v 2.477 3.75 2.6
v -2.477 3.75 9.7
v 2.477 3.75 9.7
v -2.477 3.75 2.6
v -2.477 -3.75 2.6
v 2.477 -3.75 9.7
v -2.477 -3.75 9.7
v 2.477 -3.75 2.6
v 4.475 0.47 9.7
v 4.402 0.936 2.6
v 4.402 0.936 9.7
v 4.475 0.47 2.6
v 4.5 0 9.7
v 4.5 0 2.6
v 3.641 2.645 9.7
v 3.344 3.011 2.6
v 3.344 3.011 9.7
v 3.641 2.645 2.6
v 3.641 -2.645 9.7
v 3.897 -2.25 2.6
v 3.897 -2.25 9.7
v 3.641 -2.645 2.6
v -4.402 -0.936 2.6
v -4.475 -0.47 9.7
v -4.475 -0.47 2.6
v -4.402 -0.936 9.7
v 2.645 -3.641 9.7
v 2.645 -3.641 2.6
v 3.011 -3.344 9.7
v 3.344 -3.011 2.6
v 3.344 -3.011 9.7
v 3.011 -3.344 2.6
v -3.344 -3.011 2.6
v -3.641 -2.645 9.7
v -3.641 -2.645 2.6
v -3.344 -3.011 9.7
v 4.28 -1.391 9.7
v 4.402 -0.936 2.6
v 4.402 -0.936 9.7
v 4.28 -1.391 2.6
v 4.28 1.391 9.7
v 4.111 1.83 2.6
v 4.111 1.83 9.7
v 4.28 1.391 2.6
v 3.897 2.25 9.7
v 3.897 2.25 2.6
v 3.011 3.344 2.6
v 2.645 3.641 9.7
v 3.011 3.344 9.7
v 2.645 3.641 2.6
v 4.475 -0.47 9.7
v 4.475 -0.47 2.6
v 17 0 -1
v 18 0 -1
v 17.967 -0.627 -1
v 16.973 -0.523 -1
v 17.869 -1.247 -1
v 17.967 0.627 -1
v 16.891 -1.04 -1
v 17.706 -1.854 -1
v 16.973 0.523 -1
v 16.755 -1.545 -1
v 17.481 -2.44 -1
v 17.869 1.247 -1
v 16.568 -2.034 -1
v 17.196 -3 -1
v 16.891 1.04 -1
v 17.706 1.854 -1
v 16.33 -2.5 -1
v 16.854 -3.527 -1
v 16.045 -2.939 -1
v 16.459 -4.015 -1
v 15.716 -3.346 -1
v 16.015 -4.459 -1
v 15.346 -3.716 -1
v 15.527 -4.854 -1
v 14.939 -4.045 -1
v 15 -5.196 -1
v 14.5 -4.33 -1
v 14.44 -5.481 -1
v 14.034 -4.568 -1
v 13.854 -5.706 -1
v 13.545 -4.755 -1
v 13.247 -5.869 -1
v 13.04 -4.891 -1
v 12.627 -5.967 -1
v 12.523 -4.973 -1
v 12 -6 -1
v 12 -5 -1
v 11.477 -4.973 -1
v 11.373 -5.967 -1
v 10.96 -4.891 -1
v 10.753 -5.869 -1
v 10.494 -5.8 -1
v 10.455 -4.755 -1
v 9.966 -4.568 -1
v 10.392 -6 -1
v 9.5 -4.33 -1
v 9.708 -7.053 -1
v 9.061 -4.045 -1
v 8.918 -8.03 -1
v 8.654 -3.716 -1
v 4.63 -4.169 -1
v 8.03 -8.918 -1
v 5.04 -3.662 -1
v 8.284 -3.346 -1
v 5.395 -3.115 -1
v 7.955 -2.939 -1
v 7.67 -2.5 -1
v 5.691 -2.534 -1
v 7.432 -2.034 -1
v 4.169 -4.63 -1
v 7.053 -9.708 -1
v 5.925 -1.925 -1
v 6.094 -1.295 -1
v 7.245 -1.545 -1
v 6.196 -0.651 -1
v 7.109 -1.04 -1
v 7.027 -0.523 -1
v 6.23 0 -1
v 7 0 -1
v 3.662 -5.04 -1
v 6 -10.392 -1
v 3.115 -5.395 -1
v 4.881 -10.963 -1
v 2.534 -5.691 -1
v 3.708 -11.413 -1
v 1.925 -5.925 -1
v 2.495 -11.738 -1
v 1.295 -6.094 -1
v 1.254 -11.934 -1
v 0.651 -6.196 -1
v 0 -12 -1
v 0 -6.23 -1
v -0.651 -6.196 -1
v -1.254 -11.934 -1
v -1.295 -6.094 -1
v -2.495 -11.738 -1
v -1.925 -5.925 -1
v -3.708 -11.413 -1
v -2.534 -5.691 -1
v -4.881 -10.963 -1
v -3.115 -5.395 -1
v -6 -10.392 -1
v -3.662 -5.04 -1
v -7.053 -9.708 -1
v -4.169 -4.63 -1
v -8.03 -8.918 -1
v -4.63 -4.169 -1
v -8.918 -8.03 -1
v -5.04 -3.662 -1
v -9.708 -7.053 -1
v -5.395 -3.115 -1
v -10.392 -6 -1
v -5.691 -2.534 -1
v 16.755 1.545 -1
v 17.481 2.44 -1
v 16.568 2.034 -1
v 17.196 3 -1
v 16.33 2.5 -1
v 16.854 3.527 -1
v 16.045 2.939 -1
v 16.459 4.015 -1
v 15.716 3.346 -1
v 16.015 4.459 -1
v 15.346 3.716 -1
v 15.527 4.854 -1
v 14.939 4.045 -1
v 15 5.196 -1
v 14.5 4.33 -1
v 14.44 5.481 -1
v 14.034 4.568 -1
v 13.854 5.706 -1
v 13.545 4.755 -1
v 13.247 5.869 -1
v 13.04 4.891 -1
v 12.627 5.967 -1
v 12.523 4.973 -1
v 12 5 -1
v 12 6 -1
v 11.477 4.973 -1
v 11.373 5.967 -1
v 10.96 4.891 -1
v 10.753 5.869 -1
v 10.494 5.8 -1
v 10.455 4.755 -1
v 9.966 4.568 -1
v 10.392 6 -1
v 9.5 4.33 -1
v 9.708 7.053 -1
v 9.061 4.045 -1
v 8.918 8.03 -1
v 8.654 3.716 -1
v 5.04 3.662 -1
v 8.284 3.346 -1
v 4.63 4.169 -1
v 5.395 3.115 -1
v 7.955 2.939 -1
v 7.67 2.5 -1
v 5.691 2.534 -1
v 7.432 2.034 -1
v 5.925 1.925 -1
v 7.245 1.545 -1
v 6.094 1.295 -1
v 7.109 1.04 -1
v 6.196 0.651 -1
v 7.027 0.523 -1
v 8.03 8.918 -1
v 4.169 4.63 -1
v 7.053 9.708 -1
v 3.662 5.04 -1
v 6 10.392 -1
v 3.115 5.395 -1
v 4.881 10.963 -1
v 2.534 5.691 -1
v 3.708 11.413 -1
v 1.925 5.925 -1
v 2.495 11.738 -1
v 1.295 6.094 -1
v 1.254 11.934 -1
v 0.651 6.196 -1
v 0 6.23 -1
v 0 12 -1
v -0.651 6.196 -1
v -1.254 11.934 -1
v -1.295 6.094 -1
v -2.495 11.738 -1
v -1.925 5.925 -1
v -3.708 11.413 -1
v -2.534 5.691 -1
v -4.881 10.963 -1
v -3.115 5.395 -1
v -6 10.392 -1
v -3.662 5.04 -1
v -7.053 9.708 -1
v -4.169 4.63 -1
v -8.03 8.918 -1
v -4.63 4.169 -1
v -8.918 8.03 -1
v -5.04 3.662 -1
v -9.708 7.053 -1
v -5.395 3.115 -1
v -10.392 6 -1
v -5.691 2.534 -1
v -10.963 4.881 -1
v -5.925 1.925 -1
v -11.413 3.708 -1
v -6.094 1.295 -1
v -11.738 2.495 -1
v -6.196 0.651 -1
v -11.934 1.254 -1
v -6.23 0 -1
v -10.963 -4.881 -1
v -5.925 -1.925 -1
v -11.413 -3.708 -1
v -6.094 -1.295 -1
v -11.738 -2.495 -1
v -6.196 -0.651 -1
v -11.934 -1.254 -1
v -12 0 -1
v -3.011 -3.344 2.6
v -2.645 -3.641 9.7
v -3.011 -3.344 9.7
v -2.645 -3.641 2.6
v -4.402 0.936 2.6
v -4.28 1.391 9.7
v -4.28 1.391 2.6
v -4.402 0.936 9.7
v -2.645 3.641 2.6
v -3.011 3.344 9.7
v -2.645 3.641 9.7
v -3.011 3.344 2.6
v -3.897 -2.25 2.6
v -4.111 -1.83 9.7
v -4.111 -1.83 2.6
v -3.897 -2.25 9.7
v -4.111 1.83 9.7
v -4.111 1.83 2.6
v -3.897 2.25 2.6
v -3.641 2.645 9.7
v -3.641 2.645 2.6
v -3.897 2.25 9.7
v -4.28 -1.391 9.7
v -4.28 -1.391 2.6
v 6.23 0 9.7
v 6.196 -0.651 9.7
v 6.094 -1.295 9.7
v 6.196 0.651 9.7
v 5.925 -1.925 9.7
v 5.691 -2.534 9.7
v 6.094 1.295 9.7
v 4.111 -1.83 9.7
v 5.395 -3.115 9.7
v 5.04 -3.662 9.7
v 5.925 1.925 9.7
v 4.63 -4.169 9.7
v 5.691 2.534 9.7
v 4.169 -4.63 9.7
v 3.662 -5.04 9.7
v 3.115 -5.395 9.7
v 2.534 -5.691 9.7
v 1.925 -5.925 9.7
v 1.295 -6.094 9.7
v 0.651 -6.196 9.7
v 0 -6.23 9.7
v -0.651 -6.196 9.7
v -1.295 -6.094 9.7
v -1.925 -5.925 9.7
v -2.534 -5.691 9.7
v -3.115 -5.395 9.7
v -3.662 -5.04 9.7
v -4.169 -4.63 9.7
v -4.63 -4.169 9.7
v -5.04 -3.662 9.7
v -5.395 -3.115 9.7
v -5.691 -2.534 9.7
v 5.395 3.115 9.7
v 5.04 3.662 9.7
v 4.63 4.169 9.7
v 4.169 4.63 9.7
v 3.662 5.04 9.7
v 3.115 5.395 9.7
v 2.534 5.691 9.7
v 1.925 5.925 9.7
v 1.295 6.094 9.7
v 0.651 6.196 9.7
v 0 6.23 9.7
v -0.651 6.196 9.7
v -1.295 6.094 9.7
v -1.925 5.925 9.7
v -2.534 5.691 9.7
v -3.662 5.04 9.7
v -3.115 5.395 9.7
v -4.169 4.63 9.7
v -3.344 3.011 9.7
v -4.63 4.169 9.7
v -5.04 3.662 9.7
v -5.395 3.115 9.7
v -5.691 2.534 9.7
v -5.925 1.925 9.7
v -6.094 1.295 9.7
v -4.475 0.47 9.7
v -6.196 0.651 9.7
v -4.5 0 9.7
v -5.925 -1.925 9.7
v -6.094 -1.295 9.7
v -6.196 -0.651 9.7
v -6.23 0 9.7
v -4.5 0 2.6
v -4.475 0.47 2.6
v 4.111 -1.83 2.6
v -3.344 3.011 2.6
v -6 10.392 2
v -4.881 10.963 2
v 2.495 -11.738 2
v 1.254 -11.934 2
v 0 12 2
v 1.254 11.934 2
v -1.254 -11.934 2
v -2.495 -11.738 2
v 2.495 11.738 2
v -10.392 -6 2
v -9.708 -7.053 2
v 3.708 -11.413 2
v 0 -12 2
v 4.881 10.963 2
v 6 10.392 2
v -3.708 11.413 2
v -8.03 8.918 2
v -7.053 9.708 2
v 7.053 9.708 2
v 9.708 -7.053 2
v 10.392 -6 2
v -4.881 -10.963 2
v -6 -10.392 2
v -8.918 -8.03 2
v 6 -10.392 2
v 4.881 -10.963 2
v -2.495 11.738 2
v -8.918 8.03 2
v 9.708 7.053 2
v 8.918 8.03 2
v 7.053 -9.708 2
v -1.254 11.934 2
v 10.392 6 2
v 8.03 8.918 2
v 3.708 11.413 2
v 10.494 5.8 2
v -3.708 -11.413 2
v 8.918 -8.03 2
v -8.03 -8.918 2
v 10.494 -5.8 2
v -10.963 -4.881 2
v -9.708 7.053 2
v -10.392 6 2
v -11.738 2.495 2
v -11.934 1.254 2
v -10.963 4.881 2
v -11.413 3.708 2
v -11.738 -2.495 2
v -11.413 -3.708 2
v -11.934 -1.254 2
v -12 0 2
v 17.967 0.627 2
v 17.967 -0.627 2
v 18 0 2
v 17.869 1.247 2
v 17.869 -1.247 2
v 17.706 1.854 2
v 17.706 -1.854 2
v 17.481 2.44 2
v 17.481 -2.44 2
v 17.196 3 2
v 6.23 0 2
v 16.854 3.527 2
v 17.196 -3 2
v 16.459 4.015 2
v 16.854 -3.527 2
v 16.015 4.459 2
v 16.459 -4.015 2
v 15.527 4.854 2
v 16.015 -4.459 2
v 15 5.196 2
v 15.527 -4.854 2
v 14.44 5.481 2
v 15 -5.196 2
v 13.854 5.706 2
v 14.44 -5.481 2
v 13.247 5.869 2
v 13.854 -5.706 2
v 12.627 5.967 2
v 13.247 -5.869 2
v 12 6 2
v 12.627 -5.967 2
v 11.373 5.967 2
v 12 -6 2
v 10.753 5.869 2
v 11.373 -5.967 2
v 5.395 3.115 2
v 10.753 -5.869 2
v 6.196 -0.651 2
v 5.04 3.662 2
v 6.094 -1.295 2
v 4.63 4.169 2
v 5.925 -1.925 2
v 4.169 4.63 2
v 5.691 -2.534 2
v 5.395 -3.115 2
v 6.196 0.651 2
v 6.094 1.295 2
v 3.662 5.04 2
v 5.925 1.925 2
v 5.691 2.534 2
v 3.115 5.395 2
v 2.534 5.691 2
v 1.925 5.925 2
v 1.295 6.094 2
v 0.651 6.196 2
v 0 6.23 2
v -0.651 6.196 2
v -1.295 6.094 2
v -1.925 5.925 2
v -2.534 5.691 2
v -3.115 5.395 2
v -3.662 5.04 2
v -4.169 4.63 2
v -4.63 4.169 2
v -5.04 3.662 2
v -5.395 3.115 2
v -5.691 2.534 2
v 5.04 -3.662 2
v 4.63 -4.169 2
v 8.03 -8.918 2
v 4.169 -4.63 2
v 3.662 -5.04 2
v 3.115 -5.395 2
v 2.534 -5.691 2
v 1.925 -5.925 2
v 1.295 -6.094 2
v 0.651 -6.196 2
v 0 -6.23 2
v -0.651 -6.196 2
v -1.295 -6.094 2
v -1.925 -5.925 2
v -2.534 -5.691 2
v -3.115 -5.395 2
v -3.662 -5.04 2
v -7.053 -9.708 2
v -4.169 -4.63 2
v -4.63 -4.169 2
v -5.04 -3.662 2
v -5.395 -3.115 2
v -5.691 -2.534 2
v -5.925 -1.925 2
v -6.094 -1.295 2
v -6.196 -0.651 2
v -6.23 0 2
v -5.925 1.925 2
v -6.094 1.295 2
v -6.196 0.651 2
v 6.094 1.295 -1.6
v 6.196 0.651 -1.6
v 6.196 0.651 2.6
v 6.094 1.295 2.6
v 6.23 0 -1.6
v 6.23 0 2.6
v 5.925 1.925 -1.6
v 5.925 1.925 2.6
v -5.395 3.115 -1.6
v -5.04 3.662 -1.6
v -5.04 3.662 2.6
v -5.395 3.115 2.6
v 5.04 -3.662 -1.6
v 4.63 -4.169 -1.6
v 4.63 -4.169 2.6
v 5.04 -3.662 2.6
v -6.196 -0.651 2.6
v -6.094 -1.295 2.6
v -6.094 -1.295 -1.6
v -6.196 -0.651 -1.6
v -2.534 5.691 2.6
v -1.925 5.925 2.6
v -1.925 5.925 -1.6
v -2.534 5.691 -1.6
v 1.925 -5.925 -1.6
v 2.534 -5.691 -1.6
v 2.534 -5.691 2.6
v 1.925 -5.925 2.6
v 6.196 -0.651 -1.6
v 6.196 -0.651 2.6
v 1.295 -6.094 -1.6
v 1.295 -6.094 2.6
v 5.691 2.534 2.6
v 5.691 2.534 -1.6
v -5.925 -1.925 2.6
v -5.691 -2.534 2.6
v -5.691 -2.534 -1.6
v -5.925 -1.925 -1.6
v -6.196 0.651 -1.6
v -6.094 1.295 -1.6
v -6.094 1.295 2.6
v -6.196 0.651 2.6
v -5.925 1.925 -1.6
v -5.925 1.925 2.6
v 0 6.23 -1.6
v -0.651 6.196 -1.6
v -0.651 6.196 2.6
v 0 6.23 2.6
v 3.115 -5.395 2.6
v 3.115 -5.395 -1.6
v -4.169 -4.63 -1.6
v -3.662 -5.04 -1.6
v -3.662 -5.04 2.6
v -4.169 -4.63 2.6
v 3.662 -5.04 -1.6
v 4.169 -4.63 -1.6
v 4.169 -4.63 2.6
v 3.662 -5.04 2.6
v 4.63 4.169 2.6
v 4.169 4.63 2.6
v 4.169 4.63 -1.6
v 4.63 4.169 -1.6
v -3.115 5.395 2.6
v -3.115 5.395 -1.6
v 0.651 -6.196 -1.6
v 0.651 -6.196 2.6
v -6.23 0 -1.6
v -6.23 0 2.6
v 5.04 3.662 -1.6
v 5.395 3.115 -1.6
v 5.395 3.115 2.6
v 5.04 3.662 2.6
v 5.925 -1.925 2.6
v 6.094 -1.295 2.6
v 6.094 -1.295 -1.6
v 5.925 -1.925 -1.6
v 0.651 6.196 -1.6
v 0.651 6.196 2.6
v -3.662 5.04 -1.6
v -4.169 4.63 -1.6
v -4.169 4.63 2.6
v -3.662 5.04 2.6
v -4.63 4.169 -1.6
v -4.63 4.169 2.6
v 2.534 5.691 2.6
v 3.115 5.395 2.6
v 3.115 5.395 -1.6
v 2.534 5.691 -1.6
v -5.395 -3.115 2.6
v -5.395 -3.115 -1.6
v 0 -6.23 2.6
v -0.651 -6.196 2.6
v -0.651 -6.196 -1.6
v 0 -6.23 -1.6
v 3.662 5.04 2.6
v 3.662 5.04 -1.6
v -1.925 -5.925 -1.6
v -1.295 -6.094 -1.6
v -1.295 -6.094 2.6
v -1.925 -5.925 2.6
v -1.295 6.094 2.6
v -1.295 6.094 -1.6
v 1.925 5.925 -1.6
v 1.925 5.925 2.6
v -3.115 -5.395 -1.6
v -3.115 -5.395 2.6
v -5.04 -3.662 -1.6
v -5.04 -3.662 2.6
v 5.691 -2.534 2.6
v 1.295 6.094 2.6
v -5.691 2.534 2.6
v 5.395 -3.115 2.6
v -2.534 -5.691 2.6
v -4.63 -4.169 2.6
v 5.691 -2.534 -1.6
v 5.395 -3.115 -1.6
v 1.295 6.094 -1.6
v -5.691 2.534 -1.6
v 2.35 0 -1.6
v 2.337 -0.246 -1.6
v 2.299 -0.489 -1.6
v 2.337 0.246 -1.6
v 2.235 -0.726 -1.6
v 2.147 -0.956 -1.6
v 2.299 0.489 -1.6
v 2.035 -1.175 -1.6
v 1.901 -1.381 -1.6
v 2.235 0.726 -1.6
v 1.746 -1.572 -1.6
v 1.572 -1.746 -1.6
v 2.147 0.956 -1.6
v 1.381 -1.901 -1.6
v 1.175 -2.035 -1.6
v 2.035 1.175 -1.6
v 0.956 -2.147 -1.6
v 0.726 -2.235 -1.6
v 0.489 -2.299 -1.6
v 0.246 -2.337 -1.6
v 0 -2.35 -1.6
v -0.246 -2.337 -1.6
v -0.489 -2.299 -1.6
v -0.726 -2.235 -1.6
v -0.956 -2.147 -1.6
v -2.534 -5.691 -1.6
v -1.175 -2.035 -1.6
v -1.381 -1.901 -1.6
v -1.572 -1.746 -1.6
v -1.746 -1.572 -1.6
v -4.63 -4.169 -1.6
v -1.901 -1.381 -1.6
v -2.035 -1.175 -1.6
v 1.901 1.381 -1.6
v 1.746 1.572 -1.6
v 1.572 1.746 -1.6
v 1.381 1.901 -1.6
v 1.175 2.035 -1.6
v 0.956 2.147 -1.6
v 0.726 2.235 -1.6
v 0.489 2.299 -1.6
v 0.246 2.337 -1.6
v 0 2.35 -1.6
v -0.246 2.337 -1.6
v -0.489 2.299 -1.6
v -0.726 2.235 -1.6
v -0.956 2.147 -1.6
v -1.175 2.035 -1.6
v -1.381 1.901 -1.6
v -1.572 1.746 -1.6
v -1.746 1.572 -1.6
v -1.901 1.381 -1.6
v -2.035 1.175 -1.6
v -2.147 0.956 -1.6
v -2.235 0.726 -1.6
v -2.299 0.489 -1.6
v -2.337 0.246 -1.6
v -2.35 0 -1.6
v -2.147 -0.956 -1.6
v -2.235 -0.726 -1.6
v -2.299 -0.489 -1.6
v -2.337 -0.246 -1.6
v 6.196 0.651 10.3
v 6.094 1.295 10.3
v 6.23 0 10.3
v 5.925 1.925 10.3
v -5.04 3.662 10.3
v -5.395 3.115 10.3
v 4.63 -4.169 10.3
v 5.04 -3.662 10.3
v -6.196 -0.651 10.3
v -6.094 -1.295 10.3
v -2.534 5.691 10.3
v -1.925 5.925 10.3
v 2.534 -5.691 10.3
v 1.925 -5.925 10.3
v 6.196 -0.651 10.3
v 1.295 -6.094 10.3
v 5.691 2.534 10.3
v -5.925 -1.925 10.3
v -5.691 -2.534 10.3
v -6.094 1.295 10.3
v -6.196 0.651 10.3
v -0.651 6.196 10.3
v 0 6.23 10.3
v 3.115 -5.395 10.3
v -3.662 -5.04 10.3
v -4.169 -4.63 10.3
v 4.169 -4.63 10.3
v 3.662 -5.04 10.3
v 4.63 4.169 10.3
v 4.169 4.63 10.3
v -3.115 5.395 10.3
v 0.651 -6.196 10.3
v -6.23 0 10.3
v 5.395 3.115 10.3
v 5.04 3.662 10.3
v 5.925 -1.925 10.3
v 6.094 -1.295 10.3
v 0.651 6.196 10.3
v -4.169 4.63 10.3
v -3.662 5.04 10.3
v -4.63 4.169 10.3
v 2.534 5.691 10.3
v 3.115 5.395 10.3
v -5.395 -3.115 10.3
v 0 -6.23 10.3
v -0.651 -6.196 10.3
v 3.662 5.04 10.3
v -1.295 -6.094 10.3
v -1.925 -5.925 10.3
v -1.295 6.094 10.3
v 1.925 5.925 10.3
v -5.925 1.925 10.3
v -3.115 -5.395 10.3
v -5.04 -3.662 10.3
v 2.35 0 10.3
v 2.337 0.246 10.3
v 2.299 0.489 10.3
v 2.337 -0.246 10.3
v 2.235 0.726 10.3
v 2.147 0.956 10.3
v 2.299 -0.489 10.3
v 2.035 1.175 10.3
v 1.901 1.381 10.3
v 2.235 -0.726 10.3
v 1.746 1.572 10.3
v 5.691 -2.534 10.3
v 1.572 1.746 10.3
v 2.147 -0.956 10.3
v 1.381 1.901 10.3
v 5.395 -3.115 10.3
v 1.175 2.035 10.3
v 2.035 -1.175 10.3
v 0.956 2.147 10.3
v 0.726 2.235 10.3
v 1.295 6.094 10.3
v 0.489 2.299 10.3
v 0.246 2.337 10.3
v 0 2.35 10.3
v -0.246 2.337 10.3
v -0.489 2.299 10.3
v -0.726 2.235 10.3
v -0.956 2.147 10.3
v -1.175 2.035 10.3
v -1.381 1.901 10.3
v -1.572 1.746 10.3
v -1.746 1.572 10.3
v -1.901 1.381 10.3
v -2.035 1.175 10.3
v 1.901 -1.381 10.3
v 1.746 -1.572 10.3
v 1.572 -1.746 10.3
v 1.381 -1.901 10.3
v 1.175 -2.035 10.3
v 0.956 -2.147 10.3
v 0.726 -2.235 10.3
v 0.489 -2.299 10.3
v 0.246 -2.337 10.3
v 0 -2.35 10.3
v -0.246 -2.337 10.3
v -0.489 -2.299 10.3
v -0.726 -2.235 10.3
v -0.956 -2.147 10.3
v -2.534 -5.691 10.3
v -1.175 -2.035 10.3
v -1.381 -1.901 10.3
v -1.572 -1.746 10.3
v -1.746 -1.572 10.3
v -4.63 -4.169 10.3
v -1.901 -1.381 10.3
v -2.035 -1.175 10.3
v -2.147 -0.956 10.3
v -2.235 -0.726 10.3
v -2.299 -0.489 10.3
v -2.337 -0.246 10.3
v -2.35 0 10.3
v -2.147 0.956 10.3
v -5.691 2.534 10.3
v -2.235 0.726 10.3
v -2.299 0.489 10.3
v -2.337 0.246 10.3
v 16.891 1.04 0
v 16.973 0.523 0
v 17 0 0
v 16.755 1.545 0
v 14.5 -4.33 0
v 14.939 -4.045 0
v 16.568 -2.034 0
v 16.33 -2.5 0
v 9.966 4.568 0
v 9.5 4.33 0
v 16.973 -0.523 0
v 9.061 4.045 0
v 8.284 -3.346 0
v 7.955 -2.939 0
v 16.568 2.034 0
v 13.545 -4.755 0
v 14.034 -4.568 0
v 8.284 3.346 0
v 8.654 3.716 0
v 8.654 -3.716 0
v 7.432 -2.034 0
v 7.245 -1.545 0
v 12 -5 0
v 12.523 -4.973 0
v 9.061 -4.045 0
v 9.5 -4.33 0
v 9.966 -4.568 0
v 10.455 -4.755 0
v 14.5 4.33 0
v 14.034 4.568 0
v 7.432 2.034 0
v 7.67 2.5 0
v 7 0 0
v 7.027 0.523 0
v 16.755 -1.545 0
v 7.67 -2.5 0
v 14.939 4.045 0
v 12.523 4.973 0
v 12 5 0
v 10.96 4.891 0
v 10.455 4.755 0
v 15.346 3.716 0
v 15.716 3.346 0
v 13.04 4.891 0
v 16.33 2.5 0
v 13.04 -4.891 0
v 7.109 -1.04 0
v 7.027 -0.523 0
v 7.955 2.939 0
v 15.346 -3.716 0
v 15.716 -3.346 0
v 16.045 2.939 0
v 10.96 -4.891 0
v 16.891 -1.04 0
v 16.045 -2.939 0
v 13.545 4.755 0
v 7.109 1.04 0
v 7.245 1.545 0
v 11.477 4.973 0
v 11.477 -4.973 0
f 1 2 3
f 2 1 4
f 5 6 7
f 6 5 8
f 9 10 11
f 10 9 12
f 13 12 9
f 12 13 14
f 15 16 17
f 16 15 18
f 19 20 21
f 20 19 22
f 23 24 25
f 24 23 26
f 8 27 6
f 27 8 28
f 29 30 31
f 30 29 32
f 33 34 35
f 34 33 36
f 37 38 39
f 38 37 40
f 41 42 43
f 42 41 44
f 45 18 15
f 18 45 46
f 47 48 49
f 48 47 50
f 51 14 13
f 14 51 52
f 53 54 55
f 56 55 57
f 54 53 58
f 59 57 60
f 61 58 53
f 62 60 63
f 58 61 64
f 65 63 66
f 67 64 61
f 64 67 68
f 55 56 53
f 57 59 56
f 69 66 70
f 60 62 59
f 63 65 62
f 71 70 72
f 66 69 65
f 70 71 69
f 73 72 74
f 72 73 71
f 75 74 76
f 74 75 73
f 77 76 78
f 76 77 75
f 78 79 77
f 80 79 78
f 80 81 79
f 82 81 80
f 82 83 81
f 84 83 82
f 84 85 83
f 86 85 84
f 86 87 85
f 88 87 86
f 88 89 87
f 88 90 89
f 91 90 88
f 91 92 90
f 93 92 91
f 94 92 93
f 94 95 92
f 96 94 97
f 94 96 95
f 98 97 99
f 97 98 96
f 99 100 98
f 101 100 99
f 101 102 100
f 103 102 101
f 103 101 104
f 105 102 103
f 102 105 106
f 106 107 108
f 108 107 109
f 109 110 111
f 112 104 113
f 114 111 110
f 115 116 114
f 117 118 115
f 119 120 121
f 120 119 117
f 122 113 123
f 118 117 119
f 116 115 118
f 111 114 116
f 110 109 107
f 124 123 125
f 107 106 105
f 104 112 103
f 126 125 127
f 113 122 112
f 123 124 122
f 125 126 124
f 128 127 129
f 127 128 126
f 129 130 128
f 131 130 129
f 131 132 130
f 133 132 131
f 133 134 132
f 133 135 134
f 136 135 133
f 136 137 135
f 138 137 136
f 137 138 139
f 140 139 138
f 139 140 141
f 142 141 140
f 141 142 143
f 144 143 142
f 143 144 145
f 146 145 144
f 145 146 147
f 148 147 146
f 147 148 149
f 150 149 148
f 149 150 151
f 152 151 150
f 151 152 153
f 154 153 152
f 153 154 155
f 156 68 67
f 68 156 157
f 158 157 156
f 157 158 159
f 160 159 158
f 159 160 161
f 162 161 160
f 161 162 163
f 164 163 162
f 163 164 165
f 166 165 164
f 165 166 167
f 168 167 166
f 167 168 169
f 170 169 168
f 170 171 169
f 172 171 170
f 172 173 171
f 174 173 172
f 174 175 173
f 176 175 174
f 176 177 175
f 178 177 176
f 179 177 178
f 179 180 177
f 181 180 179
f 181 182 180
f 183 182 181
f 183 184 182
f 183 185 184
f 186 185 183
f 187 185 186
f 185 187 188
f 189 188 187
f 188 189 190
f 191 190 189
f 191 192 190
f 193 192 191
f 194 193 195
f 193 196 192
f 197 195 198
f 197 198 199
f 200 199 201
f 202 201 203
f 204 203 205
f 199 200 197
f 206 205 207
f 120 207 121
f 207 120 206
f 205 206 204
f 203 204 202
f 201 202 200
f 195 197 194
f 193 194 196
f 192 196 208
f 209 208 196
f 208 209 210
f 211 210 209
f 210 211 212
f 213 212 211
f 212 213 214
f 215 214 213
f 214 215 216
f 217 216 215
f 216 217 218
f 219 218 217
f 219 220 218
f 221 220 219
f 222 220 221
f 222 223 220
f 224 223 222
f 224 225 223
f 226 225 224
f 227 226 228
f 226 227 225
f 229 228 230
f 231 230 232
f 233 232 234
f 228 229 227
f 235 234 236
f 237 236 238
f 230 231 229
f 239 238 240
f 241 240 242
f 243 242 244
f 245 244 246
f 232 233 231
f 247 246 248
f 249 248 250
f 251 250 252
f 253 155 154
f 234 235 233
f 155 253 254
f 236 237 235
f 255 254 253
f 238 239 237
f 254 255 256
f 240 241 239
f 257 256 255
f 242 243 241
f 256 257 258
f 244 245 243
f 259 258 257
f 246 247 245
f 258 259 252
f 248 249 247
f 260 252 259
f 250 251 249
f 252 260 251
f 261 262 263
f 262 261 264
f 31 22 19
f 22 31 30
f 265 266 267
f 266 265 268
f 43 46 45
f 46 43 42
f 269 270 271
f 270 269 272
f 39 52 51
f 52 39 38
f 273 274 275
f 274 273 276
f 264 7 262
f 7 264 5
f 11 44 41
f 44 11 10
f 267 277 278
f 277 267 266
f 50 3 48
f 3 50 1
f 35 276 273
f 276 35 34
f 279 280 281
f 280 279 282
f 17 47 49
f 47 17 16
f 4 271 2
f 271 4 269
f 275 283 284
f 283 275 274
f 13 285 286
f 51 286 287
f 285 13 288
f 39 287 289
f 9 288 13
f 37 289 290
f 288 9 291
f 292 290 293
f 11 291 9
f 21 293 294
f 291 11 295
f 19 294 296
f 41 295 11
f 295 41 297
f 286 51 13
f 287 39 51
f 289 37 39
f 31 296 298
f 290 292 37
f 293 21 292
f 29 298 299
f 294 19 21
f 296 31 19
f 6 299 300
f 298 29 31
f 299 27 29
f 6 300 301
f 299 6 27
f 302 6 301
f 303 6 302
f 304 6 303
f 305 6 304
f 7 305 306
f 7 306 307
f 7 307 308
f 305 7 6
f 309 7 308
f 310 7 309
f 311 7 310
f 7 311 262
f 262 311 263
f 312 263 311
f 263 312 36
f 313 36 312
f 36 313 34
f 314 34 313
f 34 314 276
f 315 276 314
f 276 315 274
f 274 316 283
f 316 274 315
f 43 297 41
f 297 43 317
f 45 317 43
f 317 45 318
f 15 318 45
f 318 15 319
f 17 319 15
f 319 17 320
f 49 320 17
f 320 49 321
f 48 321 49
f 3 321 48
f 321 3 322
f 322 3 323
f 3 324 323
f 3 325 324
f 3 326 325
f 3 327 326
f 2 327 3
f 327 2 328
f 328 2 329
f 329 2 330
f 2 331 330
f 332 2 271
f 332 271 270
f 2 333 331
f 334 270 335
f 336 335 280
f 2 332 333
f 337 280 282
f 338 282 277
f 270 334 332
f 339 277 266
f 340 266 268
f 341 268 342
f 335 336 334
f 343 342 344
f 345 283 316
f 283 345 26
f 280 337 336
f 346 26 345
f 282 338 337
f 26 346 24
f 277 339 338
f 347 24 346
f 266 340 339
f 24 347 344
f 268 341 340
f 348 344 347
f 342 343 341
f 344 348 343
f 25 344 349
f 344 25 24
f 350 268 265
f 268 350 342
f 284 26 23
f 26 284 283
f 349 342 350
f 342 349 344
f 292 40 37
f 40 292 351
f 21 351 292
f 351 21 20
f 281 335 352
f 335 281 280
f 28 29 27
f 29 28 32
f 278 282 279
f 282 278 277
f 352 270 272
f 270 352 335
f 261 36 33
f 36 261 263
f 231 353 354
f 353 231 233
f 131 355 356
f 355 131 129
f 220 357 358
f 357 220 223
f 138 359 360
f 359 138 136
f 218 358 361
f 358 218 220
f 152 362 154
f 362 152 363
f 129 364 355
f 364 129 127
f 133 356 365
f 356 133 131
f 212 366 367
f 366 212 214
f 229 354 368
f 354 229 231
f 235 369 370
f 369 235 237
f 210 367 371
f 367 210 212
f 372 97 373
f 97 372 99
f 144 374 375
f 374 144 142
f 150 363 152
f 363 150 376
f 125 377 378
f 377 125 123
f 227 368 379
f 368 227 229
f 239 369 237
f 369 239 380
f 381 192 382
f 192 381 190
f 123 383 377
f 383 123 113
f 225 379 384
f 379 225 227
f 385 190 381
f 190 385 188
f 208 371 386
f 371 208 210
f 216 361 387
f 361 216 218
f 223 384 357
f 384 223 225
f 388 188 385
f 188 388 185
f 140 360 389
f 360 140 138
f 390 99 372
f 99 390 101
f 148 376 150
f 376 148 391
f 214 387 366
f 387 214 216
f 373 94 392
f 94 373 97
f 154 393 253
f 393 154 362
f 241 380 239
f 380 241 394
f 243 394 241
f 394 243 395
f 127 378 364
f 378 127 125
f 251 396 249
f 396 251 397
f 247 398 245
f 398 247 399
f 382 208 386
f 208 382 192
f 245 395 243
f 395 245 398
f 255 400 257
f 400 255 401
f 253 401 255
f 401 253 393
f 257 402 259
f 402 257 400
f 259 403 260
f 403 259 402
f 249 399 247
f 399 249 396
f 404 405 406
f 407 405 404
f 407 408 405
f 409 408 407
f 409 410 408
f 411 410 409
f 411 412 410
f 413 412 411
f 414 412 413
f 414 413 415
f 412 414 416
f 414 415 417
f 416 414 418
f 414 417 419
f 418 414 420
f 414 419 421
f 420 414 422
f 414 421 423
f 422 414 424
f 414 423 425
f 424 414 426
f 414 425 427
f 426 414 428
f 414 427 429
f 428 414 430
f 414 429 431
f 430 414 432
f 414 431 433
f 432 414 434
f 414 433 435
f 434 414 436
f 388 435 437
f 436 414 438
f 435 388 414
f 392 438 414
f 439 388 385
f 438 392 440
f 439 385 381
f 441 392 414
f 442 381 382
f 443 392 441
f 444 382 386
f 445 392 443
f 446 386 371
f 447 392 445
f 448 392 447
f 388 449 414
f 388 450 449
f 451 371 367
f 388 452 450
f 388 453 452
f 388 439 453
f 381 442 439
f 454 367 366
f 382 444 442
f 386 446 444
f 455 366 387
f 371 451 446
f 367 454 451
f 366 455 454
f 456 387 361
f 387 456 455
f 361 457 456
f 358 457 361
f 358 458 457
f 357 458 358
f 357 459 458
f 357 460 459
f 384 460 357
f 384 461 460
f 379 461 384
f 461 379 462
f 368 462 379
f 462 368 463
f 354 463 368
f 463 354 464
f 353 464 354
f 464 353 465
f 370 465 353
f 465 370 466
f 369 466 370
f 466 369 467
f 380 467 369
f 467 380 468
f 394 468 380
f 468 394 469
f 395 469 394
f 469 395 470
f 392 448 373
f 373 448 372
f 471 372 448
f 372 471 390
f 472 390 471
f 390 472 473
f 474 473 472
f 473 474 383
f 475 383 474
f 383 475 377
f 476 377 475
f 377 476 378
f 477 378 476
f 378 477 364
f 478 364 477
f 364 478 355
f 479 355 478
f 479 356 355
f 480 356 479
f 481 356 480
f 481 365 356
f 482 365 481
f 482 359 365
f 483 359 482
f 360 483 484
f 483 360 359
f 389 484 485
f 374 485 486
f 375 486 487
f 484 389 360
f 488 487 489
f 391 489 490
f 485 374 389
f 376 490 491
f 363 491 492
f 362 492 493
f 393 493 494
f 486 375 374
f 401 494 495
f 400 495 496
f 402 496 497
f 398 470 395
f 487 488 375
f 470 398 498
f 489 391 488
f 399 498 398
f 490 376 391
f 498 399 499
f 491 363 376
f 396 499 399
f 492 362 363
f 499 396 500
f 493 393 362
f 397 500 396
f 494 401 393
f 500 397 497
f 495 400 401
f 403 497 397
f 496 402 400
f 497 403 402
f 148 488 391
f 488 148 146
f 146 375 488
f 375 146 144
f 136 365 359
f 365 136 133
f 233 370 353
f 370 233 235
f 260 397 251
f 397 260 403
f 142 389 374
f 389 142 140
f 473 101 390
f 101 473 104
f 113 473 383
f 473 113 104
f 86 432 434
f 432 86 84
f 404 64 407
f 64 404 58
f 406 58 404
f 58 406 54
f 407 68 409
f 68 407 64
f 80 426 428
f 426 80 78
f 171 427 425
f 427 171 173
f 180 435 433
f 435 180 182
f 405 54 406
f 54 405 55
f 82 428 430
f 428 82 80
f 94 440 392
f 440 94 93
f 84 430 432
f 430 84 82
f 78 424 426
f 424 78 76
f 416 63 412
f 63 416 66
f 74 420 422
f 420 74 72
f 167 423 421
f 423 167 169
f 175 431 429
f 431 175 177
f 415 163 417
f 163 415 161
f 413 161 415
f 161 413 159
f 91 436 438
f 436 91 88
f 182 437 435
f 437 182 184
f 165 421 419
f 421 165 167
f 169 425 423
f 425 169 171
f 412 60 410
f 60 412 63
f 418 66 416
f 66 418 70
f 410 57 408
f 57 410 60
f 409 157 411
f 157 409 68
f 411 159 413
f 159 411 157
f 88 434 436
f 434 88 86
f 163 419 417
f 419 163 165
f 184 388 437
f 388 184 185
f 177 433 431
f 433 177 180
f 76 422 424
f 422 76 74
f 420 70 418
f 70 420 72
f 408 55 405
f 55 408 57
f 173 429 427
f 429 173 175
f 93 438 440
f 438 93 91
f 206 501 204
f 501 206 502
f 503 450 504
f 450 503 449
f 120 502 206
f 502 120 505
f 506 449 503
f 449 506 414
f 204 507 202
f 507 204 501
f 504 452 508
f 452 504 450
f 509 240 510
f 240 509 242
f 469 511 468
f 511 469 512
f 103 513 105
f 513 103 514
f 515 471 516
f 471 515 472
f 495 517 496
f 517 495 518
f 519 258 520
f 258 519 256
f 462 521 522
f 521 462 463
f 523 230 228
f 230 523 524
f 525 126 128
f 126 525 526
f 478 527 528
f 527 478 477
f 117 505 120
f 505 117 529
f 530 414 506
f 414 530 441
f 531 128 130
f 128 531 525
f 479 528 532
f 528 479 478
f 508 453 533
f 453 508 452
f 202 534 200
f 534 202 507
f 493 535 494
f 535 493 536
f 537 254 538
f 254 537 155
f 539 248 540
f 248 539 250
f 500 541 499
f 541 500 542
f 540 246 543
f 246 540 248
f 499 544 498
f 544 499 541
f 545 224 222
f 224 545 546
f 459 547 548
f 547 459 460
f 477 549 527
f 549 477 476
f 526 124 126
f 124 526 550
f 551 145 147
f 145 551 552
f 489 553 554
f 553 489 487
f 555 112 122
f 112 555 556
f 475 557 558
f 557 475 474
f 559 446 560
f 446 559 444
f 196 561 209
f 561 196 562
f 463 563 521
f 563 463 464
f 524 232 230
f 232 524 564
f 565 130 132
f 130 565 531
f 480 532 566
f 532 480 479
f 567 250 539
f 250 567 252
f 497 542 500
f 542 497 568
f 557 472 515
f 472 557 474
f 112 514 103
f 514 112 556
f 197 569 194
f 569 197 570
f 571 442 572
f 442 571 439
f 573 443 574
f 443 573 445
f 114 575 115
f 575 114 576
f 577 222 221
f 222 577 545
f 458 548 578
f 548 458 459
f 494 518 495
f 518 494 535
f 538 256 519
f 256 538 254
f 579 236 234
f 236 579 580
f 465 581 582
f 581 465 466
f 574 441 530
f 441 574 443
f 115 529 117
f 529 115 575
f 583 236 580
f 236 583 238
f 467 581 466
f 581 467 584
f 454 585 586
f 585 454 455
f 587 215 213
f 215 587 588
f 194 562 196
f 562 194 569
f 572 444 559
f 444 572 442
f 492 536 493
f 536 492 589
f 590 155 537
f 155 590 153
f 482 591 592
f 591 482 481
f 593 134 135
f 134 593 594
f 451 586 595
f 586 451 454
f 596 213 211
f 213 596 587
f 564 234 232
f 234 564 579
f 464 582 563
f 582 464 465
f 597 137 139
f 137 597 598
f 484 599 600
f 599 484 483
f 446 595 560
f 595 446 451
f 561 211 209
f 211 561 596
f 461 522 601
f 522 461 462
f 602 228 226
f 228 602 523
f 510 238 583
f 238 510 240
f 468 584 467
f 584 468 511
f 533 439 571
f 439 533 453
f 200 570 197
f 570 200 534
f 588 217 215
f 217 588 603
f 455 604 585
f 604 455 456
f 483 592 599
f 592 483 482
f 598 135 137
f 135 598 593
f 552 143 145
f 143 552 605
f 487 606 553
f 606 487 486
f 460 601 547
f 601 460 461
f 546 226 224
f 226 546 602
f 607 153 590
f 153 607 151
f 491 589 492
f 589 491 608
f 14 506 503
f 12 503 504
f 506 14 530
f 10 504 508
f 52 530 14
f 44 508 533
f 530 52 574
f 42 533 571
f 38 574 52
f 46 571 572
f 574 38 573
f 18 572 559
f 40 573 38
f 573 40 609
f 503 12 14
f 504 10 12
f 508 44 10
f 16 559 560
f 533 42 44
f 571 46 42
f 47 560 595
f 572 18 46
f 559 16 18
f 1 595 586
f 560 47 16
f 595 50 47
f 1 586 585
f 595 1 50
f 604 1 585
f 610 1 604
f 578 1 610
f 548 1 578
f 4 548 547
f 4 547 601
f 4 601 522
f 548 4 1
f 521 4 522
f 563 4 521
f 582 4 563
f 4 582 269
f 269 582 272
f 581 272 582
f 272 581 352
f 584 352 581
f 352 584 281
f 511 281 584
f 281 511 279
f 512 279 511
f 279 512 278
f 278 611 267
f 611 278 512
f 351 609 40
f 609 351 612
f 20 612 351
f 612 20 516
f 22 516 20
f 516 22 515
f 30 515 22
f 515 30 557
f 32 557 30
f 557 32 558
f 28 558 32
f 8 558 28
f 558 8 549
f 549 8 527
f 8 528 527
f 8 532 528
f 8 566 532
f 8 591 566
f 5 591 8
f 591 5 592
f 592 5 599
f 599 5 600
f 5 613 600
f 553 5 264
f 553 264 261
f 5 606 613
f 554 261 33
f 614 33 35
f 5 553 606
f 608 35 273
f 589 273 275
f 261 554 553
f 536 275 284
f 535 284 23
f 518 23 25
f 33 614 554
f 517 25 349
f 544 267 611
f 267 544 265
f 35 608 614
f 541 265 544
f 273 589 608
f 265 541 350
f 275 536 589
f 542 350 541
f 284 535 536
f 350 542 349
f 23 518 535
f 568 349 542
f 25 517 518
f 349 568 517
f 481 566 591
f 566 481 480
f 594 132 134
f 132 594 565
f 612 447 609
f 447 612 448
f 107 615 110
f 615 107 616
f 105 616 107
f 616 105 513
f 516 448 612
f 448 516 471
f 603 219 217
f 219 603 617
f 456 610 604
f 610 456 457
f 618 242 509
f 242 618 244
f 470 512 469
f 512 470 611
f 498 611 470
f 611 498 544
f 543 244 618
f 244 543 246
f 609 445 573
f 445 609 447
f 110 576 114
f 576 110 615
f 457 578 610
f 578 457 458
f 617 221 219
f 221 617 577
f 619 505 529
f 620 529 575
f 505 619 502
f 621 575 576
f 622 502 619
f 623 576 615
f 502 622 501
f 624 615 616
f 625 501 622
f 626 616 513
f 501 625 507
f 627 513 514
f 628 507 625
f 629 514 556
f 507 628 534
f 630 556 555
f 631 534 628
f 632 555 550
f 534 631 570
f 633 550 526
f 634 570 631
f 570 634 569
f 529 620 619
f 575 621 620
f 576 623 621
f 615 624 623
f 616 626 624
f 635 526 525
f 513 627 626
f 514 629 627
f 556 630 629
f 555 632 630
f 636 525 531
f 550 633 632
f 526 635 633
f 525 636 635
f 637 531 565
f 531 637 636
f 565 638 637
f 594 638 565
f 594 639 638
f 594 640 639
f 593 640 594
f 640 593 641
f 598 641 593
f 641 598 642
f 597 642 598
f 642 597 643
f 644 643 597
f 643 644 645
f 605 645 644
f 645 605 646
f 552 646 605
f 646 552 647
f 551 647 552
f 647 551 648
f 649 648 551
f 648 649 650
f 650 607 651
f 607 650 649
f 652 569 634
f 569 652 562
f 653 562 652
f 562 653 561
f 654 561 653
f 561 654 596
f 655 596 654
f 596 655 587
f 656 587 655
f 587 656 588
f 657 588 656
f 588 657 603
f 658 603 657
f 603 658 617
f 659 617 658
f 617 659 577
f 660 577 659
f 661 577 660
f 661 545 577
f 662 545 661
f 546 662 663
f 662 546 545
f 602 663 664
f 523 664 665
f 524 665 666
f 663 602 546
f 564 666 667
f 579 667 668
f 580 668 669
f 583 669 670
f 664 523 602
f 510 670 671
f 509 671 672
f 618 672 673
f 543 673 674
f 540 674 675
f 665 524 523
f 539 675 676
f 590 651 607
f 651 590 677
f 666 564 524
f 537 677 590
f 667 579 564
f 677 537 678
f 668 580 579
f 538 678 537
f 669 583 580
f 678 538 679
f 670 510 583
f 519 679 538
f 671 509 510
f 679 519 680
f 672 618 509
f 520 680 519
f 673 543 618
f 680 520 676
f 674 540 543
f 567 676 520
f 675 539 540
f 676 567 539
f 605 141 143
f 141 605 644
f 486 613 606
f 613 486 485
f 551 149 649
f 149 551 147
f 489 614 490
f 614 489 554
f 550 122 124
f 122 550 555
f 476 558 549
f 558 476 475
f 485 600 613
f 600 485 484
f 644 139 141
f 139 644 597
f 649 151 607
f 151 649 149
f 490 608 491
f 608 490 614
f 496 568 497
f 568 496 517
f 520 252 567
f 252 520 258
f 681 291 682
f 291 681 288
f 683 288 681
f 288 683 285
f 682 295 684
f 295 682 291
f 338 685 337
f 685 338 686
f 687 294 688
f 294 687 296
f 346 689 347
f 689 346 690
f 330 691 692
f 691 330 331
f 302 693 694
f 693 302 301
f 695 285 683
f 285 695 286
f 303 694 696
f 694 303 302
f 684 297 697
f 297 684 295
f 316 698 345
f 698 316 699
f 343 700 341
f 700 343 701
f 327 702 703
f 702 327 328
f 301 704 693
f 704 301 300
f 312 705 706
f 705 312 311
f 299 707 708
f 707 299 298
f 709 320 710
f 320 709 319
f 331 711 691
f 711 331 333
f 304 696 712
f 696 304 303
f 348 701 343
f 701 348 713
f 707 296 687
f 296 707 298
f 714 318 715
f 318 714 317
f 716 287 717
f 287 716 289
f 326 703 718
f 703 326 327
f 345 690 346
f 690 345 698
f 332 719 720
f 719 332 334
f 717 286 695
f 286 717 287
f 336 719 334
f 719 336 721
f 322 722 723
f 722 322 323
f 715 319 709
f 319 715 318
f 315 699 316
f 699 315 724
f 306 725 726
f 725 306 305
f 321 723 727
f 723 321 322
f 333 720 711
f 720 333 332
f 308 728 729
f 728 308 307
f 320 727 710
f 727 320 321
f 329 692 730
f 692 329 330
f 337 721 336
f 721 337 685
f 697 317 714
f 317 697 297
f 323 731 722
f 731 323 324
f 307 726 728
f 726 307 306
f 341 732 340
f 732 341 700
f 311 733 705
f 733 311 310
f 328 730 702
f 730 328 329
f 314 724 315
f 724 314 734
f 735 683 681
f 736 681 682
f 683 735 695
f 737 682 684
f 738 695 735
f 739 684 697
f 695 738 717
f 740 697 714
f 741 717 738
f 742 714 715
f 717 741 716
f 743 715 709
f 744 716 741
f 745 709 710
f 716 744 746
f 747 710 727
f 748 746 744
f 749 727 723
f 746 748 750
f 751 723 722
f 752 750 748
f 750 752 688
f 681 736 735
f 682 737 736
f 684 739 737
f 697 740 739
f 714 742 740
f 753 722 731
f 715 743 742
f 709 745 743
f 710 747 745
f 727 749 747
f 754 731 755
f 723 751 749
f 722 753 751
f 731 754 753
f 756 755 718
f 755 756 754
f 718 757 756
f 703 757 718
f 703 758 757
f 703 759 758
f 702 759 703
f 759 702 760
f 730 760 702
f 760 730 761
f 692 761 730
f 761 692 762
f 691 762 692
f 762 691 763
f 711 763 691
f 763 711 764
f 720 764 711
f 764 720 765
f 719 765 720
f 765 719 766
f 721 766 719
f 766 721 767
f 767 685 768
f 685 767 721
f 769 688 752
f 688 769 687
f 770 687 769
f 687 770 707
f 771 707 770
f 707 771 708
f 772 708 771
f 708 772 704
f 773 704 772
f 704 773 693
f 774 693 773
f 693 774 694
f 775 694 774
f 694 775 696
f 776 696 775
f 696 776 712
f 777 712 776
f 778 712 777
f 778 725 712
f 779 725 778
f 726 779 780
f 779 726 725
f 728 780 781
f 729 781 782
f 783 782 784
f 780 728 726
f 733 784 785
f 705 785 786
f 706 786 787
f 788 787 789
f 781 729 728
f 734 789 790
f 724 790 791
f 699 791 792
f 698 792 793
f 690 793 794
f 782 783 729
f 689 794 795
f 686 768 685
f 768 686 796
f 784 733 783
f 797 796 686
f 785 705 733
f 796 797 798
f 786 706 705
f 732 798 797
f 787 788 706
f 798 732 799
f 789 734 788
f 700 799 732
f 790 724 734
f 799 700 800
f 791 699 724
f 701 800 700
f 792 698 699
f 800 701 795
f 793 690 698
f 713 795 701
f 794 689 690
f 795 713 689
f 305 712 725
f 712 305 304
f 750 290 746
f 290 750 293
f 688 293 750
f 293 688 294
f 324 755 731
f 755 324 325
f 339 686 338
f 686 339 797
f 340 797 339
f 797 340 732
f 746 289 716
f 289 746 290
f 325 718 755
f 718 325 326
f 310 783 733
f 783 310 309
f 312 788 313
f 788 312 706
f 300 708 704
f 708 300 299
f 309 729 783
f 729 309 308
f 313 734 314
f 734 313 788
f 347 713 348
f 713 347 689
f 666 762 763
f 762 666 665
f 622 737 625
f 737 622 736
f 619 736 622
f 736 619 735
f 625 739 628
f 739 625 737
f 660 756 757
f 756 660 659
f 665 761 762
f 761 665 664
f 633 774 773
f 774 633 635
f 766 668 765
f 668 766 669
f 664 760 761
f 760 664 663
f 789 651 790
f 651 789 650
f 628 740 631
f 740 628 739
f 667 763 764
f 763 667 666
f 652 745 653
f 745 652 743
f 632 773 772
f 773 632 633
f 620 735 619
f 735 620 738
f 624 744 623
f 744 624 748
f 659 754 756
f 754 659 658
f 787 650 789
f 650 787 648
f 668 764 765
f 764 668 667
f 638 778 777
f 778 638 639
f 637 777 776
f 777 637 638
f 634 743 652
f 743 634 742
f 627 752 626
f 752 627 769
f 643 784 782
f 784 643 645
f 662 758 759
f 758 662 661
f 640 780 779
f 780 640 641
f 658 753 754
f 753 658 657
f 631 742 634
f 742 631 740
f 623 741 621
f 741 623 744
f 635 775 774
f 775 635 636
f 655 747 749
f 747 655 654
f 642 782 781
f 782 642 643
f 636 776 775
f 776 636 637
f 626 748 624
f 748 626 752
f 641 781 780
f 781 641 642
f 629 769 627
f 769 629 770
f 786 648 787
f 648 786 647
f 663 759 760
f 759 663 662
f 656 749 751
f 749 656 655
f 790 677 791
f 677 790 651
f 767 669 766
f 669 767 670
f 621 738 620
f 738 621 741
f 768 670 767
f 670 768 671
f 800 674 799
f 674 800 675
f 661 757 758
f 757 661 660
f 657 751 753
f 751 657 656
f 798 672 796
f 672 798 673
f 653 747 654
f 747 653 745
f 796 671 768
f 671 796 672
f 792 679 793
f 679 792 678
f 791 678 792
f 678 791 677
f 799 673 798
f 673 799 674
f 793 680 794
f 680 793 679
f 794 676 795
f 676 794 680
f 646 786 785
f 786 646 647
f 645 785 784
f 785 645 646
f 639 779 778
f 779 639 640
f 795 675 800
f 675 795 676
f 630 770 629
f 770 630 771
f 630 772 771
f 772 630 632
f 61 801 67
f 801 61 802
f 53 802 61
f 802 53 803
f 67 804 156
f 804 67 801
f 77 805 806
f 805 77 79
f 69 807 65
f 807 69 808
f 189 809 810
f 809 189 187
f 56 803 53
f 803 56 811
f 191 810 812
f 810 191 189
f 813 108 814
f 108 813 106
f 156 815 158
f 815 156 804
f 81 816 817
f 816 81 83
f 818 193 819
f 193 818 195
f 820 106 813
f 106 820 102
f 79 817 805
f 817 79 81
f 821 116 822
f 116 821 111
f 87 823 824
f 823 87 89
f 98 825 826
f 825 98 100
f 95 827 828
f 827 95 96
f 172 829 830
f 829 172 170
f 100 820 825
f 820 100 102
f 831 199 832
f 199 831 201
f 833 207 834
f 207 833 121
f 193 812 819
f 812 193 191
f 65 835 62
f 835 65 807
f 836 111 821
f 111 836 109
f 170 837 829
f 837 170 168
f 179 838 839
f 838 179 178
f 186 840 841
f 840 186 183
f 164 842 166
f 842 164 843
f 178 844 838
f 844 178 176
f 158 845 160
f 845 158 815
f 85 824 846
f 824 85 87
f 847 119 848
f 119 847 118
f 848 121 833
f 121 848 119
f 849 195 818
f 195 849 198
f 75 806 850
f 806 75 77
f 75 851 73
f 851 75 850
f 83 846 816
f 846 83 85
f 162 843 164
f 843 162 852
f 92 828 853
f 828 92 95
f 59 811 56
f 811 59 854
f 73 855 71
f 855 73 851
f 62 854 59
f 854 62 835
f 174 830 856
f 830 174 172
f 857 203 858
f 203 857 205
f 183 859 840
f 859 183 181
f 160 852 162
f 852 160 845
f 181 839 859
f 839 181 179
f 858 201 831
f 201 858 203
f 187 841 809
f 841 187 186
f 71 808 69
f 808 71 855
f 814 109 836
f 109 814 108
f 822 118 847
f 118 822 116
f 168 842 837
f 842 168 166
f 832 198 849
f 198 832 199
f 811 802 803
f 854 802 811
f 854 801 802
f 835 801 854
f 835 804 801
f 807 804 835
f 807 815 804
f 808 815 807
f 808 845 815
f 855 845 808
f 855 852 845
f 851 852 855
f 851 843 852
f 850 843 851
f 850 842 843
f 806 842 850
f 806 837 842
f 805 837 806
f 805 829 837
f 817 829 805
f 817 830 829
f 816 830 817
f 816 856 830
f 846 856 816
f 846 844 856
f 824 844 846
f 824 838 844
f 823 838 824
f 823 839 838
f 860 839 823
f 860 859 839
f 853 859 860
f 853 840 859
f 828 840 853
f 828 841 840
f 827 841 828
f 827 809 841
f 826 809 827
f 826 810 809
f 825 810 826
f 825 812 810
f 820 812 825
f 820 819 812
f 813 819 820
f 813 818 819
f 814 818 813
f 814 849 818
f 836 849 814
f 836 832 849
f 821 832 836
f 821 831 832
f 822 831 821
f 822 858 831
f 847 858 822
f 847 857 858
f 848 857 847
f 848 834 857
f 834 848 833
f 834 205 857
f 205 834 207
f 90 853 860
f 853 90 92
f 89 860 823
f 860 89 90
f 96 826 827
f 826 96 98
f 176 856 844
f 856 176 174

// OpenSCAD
$fn=60;

// thickness of the wall.
wall_thickness = 1;

// diameter of the plunger
plunger_diameter = 22;
// height of the plunger
plunger_height = 5;

// concave top? this will only work with diameter==22. ...can't be bothered with math right now.
plunger_concave =false;


/* values from happ:
(i assume their values are inches, since there is no unit...)
ext bezel diam = 1.3in (33mm)
bezel height = no idea. i will guess 0.14in (3.5mm)
plunger diam = 0.87in (22mm)
plunger height out of bezel = 0.14in (3.5mm)
plunger travel = no idea.
threaded body diam = 1.10in (27.95mm)

mounting hole diameter = 1.13in (28.7mm)
*/


module p1(dlarge, dsmall, droller){
	difference(){
		union(){
			translate([0,0,-wall_thickness]) color("green")  // large
				cylinder( h=wall_thickness*3, r=dlarge/2, center=false);
			translate([dsmall,0,-wall_thickness]) color("green")  // small
				cylinder( h=wall_thickness*3, r=dsmall/2, center=false);
			difference(){
				translate([0,0,-wall_thickness]) color("green")  // shaft
					cylinder( h=10.7, r=droller/2, center=false);
				union(){  // 7.5
					translate([-10,7.5/2,0]) color("lightgreen")  // sides
						cube([20,10,20]);
					translate([-10,-7.5/2-10,0]) color("lightgreen")  // sides
						cube([20,10,20]);
				}
			}
			translate([0,0,-wall_thickness-.6]) color("darkgreen") // lower rim
				cylinder( h=wall_thickness*3+1.2, r=12.46/2, center=false);
			translate([0,0,9.7]) color("darkgreen") // upper rim
				cylinder( h=.6, r=12.46/2, center=false);
		}
		union(){
			translate([0,0,-30]) color("green") // shaft hole
				cylinder( h=100, r=4.7/2, center=false);
			translate([dlarge/2,0,-wall_thickness*2]) color("lightgreen")  // small cut out
				cylinder( h=wall_thickness*2, r=dsmall/2-wall_thickness, center=false);
		}
	}
}
p1(24,12,9);
